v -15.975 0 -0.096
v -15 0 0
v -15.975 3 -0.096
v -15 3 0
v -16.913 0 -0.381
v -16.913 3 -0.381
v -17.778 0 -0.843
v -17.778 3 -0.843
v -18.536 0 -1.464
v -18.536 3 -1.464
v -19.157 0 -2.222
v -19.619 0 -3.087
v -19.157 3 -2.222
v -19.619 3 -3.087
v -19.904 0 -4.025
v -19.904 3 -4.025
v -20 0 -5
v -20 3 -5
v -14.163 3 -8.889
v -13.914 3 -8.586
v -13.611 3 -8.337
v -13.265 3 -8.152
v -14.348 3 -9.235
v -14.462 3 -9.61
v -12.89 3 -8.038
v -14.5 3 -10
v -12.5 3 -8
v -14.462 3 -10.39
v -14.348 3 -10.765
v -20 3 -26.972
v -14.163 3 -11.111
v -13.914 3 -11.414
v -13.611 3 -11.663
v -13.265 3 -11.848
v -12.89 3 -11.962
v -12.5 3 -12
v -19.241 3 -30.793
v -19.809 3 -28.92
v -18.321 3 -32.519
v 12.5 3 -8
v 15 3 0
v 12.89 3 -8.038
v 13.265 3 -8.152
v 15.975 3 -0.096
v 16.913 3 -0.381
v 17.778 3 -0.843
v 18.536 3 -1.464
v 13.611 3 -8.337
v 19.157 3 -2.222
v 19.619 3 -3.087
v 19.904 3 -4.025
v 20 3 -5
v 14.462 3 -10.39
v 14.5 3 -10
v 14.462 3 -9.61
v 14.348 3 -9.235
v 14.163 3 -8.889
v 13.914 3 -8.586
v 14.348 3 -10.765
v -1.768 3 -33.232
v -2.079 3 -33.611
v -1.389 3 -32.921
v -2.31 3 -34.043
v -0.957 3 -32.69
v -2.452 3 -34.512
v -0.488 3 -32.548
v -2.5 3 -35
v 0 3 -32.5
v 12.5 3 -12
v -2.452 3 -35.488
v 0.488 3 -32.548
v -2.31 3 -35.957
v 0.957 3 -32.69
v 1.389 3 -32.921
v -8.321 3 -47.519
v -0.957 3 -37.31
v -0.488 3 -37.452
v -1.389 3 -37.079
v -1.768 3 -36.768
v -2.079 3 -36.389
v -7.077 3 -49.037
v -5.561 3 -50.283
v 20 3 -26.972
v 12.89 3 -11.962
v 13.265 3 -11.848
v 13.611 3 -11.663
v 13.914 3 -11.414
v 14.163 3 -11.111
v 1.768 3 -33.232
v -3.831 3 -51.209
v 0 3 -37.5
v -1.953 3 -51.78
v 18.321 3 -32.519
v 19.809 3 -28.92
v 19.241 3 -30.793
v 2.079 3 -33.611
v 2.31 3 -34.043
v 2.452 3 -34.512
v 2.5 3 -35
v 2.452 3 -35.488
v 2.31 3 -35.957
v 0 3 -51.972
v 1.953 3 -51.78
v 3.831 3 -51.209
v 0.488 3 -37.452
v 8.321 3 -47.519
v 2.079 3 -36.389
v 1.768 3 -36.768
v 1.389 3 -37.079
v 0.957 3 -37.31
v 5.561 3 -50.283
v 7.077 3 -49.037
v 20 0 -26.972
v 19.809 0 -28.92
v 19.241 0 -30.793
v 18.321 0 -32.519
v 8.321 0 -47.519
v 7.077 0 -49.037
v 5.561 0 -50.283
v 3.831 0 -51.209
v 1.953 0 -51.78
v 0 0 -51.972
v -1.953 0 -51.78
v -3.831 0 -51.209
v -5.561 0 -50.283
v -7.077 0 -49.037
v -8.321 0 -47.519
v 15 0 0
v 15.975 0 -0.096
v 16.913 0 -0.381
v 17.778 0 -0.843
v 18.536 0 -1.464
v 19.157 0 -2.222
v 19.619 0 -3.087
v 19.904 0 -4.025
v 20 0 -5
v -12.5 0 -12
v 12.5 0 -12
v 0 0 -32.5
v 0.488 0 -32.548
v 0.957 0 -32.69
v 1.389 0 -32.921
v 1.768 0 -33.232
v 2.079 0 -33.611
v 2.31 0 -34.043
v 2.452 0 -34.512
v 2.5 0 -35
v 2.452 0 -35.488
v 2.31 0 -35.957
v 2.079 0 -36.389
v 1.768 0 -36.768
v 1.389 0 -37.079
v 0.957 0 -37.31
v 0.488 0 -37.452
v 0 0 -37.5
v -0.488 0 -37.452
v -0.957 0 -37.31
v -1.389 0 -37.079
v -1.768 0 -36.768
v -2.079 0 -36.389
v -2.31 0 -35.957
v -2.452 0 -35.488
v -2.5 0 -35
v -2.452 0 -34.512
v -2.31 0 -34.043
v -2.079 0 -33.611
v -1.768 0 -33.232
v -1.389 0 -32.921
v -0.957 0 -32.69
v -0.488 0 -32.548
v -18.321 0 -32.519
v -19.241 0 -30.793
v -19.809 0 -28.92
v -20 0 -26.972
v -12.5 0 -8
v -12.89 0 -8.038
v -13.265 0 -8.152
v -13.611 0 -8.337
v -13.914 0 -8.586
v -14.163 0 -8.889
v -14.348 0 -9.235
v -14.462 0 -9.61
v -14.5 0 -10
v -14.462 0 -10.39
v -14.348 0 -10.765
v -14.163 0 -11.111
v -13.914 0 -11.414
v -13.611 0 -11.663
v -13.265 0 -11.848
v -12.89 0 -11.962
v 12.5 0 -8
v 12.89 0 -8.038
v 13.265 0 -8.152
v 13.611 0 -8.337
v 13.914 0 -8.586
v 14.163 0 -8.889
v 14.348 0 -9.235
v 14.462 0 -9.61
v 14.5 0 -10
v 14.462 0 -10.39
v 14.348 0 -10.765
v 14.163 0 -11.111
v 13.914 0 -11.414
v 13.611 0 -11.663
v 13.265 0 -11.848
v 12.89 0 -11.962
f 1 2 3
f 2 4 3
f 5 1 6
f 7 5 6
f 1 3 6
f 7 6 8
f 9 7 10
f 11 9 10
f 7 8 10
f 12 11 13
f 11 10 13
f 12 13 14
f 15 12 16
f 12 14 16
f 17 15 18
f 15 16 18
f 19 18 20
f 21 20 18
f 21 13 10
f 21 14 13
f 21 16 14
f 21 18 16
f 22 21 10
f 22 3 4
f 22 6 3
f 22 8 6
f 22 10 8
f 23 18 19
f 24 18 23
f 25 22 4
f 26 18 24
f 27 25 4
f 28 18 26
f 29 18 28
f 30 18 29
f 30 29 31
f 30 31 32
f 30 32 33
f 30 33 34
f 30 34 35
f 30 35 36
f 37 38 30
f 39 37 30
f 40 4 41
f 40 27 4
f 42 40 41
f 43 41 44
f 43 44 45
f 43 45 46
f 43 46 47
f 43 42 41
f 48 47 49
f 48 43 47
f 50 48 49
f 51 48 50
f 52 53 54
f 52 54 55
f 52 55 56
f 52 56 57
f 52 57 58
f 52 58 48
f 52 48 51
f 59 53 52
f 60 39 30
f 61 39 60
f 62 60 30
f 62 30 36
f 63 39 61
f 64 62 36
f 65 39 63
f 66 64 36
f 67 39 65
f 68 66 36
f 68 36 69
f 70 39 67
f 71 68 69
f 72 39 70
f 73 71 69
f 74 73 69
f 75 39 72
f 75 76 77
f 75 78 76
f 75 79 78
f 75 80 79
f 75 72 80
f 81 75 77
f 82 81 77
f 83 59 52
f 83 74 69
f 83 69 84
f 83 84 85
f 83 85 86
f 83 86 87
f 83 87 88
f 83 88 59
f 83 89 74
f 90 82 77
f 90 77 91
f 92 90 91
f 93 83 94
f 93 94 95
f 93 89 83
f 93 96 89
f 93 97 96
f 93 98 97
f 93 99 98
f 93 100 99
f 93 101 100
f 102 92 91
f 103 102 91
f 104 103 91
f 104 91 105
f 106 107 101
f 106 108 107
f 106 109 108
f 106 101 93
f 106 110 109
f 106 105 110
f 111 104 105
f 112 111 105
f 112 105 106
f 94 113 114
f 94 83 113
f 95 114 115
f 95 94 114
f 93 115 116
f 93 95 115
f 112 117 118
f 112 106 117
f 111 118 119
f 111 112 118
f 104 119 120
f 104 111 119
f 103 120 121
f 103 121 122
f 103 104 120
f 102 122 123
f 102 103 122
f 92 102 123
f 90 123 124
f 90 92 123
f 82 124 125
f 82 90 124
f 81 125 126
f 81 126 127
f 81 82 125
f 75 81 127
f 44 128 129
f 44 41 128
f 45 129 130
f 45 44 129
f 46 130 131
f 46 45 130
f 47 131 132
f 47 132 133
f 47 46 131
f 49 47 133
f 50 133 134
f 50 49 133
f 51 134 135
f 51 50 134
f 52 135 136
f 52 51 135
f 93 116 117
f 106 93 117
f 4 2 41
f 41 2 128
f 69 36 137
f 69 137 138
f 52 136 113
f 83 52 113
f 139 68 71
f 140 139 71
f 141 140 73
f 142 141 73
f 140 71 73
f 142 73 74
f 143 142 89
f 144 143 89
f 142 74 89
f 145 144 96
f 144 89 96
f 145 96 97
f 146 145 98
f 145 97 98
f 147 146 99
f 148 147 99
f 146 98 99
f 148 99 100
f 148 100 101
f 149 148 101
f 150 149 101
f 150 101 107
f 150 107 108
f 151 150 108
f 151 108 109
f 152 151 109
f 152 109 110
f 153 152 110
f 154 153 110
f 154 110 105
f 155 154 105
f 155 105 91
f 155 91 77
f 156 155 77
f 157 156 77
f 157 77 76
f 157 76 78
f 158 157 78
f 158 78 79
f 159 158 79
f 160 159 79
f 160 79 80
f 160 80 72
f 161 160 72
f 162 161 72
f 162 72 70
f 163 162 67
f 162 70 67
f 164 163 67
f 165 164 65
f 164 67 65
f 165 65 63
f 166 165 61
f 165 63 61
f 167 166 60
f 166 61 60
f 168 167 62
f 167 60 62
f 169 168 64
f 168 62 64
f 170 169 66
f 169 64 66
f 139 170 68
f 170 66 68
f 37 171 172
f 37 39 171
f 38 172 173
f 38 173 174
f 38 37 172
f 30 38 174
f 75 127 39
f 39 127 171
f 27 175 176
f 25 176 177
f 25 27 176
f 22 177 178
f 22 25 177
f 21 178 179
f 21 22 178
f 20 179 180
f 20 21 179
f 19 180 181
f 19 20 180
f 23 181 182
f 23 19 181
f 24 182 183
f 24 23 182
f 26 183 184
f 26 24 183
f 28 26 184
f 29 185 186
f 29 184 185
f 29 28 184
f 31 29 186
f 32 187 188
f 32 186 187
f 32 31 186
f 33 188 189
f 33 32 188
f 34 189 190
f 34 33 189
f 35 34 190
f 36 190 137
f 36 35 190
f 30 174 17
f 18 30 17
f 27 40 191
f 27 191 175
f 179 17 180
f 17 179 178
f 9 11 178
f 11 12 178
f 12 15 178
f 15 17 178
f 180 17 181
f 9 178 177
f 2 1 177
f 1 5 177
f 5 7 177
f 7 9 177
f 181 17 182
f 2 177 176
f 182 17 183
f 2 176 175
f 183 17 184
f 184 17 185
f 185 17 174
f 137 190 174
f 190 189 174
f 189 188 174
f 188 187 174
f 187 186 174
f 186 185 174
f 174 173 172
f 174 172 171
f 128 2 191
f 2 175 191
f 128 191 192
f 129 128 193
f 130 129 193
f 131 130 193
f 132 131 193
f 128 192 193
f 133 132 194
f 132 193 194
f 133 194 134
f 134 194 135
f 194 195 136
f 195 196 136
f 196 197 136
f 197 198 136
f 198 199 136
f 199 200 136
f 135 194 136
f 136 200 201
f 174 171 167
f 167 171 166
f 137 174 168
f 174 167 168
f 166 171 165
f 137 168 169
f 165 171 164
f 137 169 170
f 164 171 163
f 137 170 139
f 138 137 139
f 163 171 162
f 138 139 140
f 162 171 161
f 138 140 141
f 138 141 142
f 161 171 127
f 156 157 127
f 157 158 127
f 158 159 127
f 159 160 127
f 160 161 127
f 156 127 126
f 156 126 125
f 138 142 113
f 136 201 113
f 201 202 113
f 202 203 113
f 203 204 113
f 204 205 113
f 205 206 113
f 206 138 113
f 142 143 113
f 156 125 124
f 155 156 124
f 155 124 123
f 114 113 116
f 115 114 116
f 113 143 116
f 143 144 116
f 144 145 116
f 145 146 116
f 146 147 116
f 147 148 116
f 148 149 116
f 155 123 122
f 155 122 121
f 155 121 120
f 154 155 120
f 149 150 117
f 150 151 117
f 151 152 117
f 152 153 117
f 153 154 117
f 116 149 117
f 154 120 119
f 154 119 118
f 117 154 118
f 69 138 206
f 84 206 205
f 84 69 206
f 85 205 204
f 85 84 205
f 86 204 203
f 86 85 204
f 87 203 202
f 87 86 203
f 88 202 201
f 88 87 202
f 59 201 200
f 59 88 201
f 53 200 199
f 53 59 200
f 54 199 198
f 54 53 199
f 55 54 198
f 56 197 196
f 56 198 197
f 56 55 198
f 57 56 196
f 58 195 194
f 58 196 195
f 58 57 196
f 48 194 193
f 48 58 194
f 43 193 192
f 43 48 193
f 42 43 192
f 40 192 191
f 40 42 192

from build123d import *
from OCP.BRepFilletAPI import BRepFilletAPI_MakeFillet

# Parameters (mm, degrees)
BOSS_EXTRUDE1_DEPTH = 3
FILLET1_R1          = 10
FILLET1_R2          = 5
SKETCH2_R           = 2.5
CUT_EXTRUDE1_DEPTH  = 56.768397029


with BuildPart() as part:
    # Sketch1 → Boss-Extrude1 (new body)
    with BuildSketch(Plane(origin=(0, 0, 0), x_dir=(1, 0, 0), z_dir=(0, 1, 0))):
        Polygon((-20, 0), (20, 0), (20, 30), (0, 60), (-20, 30), align=None)
    extrude(amount=BOSS_EXTRUDE1_DEPTH)

    # Fillet1: one fillet with a radius per group of edges: ONE call of the kernel's fillet builder (fillet() takes one radius for all edges)
    fillet1_edges_1 = [part.edges().sort_by_distance(p)[0] for p in [
        (20, 1.5, -30),
        (-20, 1.5, -30),
        (0, 1.5, -60),
    ]]
    fillet1_edges_2 = [part.edges().sort_by_distance(p)[0] for p in [
        (20, 1.5, 0),
        (-20, 1.5, 0),
    ]]
    fillet1 = BRepFilletAPI_MakeFillet(part.part.solid().wrapped)
    for e in fillet1_edges_1:
        fillet1.Add(FILLET1_R1, e.wrapped)
    for e in fillet1_edges_2:
        fillet1.Add(FILLET1_R2, e.wrapped)
    add(Compound.cast(fillet1.Shape()), mode=Mode.REPLACE)

    # Sketch2 → Cut-Extrude1 (cut, through all)
    with BuildSketch(Plane(origin=(0, 3, 0), x_dir=(1, 0, 0), z_dir=(0, 1, 0))):
        with Locations((0, 35)):
            Circle(SKETCH2_R)
        with BuildLine():
            Line((-12.5, 12), (12.5, 12))
            ThreePointArc((12.5, 12), (14.5, 10), (12.5, 8))
            Line((12.5, 8), (-12.5, 8))
            ThreePointArc((-12.5, 8), (-14.5, 10), (-12.5, 12))
        make_face()
    extrude(amount=-CUT_EXTRUDE1_DEPTH, mode=Mode.SUBTRACT)


solid = part.part
